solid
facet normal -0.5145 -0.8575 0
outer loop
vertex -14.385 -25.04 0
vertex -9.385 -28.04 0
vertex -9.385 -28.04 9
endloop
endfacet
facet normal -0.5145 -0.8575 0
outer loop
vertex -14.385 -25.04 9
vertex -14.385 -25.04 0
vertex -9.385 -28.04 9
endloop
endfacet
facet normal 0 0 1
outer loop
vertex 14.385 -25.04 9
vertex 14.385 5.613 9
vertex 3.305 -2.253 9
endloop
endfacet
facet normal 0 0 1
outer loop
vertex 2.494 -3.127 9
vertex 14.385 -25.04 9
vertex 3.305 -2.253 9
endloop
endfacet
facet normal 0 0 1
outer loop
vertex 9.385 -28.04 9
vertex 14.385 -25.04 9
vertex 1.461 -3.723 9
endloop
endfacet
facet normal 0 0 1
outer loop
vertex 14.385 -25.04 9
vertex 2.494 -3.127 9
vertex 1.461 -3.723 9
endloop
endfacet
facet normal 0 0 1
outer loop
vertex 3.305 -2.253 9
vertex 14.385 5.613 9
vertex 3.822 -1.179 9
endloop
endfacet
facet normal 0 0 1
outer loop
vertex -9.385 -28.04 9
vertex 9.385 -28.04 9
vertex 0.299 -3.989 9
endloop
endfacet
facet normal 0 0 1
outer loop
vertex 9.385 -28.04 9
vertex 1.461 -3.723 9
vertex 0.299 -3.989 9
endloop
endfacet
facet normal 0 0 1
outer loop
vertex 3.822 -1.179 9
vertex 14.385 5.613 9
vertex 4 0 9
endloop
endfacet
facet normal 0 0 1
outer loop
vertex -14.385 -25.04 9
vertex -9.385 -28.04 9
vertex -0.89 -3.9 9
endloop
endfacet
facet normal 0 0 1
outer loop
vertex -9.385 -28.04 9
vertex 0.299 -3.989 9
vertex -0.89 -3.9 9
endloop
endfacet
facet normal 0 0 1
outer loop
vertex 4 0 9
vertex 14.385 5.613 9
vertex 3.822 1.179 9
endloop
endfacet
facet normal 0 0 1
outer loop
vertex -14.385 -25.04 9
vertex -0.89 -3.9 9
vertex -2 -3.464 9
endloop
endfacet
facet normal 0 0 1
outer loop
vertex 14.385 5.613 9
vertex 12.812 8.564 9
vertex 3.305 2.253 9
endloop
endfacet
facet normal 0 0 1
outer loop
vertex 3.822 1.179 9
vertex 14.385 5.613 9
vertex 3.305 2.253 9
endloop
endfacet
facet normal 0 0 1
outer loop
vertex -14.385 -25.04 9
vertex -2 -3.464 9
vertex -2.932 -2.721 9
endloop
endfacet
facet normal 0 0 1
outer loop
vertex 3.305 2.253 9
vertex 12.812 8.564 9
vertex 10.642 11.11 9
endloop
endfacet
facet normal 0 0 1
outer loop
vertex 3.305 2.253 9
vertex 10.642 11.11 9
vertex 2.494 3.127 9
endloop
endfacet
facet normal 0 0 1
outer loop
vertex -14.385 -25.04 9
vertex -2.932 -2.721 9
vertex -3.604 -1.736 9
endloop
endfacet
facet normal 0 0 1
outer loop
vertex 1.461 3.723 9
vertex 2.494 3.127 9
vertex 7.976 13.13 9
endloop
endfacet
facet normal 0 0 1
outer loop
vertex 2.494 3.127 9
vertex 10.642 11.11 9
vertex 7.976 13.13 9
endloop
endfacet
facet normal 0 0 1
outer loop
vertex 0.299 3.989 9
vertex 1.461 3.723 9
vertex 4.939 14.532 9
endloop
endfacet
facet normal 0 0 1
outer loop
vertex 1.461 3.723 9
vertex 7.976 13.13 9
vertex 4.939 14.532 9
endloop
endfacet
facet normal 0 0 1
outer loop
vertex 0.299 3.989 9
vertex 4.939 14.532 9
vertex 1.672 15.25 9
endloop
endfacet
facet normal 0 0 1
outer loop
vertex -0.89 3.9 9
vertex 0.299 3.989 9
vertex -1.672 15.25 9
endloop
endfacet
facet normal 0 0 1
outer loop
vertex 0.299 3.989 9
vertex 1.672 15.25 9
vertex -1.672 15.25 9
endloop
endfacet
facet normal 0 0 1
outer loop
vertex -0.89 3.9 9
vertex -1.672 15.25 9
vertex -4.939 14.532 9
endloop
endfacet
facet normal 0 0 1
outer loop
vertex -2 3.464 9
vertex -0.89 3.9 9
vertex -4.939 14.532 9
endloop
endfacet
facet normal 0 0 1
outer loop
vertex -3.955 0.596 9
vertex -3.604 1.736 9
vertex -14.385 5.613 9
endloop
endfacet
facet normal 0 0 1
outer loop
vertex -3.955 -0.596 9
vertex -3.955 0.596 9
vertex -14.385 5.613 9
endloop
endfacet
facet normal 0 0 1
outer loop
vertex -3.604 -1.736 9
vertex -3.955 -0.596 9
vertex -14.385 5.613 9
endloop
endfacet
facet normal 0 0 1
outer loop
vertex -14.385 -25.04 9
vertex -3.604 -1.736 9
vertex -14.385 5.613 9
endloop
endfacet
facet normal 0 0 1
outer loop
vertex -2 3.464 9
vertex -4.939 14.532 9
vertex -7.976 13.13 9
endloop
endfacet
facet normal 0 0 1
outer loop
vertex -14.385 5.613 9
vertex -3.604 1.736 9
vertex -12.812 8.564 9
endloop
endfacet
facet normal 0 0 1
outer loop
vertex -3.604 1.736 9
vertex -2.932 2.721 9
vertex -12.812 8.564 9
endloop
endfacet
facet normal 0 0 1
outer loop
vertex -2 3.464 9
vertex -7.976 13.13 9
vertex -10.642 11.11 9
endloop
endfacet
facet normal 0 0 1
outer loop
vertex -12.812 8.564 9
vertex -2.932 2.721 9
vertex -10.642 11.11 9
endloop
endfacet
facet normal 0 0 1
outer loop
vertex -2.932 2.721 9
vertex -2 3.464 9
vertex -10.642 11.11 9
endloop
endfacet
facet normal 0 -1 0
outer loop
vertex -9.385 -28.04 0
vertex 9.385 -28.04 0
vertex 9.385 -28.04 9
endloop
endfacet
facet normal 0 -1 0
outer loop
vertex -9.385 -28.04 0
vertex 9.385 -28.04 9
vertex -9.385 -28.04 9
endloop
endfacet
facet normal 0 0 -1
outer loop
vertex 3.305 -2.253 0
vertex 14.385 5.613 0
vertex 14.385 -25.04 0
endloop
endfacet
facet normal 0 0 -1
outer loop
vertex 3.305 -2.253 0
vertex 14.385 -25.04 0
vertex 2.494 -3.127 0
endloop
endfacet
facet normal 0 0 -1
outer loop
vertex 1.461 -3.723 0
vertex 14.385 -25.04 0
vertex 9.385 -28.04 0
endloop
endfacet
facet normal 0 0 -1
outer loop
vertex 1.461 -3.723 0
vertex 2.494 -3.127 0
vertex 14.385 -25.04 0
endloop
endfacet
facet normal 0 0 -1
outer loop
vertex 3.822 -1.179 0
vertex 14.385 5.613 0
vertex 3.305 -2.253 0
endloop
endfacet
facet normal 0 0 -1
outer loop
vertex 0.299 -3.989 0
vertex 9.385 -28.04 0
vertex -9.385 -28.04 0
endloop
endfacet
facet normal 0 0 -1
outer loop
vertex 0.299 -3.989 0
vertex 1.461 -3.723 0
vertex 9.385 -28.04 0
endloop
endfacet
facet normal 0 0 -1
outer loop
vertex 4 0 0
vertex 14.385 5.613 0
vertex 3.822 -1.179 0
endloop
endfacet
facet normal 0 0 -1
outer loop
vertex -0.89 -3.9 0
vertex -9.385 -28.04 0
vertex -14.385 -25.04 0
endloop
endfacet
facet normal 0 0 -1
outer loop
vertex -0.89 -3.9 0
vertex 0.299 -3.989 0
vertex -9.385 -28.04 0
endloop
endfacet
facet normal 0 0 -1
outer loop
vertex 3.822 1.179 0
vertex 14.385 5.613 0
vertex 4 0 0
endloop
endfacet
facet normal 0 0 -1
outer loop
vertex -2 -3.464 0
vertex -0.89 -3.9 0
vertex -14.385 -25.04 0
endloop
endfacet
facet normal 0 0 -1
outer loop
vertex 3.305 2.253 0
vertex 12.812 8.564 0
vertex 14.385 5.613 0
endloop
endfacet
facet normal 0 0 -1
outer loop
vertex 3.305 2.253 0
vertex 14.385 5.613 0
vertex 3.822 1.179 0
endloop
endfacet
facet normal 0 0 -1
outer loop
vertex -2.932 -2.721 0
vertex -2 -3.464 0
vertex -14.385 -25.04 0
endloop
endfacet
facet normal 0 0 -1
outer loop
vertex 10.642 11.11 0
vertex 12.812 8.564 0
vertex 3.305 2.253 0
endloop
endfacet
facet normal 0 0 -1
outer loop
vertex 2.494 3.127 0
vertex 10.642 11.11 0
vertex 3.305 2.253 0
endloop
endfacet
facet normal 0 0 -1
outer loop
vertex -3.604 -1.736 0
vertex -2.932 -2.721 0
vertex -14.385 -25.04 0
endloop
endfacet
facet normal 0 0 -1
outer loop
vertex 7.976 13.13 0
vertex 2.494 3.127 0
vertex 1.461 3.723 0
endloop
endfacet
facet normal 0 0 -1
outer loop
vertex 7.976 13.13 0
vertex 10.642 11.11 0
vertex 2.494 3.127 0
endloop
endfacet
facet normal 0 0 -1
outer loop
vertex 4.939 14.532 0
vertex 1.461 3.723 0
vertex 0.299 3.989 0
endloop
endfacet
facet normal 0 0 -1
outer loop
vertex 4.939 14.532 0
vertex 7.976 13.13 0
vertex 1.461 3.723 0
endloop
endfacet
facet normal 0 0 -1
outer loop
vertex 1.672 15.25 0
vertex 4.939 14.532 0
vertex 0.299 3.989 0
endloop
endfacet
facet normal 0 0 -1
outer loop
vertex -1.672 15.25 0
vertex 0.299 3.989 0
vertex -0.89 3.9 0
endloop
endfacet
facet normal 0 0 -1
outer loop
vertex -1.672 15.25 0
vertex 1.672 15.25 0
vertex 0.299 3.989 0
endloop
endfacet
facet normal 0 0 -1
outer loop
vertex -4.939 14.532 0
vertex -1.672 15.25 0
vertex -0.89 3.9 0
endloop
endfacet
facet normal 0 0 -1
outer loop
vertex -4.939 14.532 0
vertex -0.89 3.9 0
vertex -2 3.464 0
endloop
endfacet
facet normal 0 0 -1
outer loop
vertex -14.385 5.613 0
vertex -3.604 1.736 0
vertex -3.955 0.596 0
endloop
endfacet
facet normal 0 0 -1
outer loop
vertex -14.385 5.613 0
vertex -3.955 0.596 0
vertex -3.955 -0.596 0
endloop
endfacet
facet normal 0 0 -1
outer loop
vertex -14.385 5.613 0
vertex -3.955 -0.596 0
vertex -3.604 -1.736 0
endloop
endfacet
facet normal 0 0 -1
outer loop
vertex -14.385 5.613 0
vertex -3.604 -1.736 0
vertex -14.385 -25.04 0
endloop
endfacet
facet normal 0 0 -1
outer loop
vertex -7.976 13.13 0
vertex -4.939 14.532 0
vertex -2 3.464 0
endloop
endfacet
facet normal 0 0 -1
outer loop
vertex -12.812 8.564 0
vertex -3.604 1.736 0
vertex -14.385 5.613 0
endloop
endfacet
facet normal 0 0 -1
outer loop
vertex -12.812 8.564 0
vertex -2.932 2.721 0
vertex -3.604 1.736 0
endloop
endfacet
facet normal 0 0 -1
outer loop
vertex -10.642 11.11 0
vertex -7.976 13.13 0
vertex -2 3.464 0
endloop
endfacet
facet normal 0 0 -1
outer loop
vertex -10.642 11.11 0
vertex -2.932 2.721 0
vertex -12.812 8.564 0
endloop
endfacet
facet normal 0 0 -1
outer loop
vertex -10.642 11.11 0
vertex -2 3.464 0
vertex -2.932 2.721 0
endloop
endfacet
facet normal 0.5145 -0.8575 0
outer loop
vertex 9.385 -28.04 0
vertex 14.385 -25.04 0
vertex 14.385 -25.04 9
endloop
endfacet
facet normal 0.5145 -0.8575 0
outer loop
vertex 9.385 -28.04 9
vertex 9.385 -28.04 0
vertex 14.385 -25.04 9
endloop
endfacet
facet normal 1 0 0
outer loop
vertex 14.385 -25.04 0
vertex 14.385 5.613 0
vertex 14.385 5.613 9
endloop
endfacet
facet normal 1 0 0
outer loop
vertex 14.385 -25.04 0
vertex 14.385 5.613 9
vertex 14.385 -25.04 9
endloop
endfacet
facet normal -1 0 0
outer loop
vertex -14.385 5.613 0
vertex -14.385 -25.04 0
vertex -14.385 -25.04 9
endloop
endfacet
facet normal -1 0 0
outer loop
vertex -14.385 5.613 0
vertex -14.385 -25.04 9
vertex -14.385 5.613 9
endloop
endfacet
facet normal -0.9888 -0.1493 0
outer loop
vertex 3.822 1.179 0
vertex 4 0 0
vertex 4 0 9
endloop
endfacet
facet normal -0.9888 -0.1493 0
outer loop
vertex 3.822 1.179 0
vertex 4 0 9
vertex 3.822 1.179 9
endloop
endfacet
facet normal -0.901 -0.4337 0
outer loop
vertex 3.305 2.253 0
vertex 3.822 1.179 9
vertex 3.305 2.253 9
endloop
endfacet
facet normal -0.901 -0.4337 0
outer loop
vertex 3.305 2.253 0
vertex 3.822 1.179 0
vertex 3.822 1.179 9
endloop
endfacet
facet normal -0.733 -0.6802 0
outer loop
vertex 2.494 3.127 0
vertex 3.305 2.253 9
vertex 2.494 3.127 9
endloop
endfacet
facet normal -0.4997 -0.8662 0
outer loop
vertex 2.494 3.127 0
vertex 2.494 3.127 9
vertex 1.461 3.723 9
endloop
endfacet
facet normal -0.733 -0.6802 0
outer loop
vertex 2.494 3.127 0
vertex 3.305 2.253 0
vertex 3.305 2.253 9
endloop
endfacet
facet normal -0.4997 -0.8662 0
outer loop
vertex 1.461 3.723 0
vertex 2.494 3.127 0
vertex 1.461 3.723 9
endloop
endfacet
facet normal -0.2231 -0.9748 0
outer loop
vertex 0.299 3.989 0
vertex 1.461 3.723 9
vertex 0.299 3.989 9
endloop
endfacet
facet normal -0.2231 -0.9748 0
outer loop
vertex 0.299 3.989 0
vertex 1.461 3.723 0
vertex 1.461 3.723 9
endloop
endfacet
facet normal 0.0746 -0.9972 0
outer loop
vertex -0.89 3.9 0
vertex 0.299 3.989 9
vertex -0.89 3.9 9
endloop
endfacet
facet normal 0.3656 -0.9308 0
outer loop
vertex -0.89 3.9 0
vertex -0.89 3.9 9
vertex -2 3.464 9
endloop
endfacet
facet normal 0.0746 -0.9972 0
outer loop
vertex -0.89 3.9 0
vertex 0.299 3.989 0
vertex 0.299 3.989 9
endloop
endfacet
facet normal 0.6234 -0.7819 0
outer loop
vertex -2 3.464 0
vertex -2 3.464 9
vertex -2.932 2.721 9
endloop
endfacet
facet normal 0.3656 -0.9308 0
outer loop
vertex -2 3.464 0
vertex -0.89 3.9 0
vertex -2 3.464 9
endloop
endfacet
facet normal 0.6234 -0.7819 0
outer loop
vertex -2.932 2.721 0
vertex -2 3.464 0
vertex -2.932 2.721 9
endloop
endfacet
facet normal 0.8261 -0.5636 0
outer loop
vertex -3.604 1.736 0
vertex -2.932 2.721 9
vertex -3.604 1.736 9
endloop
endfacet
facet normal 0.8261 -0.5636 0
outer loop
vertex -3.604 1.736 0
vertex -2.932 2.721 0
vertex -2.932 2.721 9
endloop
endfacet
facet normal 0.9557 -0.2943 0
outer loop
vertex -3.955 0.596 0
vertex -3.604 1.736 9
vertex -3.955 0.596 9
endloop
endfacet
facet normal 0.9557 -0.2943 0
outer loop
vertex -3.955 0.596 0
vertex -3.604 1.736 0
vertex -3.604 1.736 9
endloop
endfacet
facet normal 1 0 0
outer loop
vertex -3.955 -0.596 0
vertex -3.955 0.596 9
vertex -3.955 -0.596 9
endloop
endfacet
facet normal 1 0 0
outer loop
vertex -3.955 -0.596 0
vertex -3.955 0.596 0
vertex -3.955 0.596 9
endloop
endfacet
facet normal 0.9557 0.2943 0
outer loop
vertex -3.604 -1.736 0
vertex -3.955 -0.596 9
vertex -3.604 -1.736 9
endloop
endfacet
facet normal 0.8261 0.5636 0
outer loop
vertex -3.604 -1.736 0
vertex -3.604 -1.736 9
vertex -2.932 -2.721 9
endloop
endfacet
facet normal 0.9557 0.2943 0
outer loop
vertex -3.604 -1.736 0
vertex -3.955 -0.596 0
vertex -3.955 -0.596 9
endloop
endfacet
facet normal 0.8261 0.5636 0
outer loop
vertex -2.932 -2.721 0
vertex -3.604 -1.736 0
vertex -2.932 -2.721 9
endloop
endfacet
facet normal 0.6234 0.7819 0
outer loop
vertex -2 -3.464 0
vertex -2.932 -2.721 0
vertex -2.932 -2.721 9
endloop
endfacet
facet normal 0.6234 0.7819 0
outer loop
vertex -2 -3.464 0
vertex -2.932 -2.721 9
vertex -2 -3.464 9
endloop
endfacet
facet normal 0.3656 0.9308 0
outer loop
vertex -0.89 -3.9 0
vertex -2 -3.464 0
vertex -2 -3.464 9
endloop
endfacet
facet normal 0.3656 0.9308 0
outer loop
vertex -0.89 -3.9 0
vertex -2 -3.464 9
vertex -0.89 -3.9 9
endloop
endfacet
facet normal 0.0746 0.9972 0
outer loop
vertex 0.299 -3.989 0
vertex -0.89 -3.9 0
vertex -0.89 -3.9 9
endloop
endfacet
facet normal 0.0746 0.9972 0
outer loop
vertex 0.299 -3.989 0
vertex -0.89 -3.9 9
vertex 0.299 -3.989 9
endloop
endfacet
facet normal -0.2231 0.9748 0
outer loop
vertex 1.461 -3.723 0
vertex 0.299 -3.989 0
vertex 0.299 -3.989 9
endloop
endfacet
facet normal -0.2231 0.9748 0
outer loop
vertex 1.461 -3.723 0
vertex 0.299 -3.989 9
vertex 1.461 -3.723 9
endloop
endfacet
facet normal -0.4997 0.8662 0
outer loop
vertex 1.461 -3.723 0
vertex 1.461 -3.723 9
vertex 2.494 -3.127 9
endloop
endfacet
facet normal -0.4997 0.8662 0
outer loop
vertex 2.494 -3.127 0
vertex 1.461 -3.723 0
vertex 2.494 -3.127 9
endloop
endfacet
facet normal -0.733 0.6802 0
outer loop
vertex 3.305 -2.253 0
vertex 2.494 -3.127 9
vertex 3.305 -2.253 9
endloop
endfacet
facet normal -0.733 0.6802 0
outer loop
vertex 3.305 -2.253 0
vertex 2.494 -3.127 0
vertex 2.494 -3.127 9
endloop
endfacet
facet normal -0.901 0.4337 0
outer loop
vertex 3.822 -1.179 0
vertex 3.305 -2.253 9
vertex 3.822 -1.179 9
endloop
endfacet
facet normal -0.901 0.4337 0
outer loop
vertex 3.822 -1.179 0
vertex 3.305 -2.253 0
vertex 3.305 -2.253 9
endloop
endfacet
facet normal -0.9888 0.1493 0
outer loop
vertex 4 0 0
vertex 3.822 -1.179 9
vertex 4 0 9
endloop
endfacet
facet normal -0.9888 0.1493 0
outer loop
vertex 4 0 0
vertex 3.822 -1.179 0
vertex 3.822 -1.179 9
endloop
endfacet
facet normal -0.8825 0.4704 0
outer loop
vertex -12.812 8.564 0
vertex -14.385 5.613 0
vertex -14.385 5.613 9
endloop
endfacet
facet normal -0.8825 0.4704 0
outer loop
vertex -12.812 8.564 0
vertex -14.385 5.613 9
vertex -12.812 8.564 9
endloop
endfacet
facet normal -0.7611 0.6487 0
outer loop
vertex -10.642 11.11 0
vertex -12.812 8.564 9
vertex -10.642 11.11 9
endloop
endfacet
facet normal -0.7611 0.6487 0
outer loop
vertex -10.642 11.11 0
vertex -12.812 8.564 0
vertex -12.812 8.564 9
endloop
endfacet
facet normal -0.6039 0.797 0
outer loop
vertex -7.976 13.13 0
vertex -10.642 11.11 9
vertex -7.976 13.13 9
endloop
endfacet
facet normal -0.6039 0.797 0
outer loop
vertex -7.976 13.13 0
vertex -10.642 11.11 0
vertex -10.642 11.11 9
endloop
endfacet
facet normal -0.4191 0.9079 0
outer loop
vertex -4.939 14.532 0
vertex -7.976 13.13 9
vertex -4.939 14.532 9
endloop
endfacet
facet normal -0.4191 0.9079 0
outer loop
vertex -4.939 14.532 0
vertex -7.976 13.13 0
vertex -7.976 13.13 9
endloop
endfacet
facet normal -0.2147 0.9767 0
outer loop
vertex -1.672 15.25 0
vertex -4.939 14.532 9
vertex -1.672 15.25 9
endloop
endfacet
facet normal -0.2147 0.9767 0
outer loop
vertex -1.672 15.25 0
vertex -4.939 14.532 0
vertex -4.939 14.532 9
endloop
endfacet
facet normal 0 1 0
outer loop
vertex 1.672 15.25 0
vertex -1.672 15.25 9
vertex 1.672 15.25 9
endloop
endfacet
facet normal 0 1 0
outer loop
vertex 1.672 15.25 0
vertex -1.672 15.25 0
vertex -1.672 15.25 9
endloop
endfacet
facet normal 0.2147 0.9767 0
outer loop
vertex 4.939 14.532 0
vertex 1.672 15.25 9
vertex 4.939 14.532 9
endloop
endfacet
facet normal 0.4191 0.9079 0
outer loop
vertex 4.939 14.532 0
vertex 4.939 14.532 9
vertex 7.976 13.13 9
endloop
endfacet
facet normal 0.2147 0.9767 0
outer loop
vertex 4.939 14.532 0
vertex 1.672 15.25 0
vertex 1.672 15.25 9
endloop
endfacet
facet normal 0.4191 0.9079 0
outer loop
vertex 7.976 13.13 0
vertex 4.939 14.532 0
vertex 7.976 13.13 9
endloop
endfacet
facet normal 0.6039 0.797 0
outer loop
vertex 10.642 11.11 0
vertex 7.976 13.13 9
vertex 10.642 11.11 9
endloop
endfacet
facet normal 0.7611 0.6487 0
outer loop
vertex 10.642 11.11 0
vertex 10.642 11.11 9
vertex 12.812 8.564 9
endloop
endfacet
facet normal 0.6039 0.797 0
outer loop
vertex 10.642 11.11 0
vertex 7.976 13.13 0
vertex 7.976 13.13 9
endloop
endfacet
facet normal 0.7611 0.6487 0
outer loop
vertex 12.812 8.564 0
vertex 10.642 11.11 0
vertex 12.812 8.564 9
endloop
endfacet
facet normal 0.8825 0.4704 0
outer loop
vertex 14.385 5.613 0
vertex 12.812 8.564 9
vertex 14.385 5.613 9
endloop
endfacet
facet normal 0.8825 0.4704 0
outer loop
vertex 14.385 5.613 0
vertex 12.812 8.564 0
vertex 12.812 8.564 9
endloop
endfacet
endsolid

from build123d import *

# Parameters (mm, degrees)
SKETCH_1_R      = 4
EXTRUDE_1_DEPTH = 9
CHAMFER_1_SIZE  = 5
CHAMFER_1_SIZE2 = 3
CHAMFER_2_SIZE  = 3
CHAMFER_2_SIZE2 = 5


with BuildPart() as part:
    # ｽｹｯﾁ1 → ﾎﾞｽ - 押し出し1 (new body)
    with BuildSketch(Plane.XY):
        with BuildLine():
            Line((14.385, -28.04), (-14.385, -28.04))
            Line((-14.385, -28.04), (-14.385, -5.612501624))
            Line((-14.385, -5.612501624), (-14.385, 5.612501624))
            ThreePointArc((-14.385, 5.612501624), (0, 15.34), (14.385, 5.612501624))
            Line((14.385, 5.612501624), (14.385, -5.612501624))
            Line((14.385, -5.612501624), (14.385, -28.04))
        make_face()
        Circle(SKETCH_1_R, mode=Mode.SUBTRACT)
    extrude(amount=EXTRUDE_1_DEPTH)

    # 面取り1
    chamfer_1_edges = [part.edges().sort_by_distance(p)[0] for p in [
        (14.385, -28.04, 4.5),
    ]]
    chamfer_1_side = [part.faces().sort_by_distance(p)[0] for p in [
        (0, -28.04, 4.5),
    ]]
    chamfer(chamfer_1_edges, length=CHAMFER_1_SIZE, length2=CHAMFER_1_SIZE2, reference=chamfer_1_side[0])

    # 面取り2
    chamfer_2_edges = [part.edges().sort_by_distance(p)[0] for p in [
        (-14.385, -28.04, 4.5),
    ]]
    chamfer_2_side = [part.faces().sort_by_distance(p)[0] for p in [
        (-14.385, -11.213749188, 4.5),
    ]]
    chamfer(chamfer_2_edges, length=CHAMFER_2_SIZE, length2=CHAMFER_2_SIZE2, reference=chamfer_2_side[0])


solid = part.part
